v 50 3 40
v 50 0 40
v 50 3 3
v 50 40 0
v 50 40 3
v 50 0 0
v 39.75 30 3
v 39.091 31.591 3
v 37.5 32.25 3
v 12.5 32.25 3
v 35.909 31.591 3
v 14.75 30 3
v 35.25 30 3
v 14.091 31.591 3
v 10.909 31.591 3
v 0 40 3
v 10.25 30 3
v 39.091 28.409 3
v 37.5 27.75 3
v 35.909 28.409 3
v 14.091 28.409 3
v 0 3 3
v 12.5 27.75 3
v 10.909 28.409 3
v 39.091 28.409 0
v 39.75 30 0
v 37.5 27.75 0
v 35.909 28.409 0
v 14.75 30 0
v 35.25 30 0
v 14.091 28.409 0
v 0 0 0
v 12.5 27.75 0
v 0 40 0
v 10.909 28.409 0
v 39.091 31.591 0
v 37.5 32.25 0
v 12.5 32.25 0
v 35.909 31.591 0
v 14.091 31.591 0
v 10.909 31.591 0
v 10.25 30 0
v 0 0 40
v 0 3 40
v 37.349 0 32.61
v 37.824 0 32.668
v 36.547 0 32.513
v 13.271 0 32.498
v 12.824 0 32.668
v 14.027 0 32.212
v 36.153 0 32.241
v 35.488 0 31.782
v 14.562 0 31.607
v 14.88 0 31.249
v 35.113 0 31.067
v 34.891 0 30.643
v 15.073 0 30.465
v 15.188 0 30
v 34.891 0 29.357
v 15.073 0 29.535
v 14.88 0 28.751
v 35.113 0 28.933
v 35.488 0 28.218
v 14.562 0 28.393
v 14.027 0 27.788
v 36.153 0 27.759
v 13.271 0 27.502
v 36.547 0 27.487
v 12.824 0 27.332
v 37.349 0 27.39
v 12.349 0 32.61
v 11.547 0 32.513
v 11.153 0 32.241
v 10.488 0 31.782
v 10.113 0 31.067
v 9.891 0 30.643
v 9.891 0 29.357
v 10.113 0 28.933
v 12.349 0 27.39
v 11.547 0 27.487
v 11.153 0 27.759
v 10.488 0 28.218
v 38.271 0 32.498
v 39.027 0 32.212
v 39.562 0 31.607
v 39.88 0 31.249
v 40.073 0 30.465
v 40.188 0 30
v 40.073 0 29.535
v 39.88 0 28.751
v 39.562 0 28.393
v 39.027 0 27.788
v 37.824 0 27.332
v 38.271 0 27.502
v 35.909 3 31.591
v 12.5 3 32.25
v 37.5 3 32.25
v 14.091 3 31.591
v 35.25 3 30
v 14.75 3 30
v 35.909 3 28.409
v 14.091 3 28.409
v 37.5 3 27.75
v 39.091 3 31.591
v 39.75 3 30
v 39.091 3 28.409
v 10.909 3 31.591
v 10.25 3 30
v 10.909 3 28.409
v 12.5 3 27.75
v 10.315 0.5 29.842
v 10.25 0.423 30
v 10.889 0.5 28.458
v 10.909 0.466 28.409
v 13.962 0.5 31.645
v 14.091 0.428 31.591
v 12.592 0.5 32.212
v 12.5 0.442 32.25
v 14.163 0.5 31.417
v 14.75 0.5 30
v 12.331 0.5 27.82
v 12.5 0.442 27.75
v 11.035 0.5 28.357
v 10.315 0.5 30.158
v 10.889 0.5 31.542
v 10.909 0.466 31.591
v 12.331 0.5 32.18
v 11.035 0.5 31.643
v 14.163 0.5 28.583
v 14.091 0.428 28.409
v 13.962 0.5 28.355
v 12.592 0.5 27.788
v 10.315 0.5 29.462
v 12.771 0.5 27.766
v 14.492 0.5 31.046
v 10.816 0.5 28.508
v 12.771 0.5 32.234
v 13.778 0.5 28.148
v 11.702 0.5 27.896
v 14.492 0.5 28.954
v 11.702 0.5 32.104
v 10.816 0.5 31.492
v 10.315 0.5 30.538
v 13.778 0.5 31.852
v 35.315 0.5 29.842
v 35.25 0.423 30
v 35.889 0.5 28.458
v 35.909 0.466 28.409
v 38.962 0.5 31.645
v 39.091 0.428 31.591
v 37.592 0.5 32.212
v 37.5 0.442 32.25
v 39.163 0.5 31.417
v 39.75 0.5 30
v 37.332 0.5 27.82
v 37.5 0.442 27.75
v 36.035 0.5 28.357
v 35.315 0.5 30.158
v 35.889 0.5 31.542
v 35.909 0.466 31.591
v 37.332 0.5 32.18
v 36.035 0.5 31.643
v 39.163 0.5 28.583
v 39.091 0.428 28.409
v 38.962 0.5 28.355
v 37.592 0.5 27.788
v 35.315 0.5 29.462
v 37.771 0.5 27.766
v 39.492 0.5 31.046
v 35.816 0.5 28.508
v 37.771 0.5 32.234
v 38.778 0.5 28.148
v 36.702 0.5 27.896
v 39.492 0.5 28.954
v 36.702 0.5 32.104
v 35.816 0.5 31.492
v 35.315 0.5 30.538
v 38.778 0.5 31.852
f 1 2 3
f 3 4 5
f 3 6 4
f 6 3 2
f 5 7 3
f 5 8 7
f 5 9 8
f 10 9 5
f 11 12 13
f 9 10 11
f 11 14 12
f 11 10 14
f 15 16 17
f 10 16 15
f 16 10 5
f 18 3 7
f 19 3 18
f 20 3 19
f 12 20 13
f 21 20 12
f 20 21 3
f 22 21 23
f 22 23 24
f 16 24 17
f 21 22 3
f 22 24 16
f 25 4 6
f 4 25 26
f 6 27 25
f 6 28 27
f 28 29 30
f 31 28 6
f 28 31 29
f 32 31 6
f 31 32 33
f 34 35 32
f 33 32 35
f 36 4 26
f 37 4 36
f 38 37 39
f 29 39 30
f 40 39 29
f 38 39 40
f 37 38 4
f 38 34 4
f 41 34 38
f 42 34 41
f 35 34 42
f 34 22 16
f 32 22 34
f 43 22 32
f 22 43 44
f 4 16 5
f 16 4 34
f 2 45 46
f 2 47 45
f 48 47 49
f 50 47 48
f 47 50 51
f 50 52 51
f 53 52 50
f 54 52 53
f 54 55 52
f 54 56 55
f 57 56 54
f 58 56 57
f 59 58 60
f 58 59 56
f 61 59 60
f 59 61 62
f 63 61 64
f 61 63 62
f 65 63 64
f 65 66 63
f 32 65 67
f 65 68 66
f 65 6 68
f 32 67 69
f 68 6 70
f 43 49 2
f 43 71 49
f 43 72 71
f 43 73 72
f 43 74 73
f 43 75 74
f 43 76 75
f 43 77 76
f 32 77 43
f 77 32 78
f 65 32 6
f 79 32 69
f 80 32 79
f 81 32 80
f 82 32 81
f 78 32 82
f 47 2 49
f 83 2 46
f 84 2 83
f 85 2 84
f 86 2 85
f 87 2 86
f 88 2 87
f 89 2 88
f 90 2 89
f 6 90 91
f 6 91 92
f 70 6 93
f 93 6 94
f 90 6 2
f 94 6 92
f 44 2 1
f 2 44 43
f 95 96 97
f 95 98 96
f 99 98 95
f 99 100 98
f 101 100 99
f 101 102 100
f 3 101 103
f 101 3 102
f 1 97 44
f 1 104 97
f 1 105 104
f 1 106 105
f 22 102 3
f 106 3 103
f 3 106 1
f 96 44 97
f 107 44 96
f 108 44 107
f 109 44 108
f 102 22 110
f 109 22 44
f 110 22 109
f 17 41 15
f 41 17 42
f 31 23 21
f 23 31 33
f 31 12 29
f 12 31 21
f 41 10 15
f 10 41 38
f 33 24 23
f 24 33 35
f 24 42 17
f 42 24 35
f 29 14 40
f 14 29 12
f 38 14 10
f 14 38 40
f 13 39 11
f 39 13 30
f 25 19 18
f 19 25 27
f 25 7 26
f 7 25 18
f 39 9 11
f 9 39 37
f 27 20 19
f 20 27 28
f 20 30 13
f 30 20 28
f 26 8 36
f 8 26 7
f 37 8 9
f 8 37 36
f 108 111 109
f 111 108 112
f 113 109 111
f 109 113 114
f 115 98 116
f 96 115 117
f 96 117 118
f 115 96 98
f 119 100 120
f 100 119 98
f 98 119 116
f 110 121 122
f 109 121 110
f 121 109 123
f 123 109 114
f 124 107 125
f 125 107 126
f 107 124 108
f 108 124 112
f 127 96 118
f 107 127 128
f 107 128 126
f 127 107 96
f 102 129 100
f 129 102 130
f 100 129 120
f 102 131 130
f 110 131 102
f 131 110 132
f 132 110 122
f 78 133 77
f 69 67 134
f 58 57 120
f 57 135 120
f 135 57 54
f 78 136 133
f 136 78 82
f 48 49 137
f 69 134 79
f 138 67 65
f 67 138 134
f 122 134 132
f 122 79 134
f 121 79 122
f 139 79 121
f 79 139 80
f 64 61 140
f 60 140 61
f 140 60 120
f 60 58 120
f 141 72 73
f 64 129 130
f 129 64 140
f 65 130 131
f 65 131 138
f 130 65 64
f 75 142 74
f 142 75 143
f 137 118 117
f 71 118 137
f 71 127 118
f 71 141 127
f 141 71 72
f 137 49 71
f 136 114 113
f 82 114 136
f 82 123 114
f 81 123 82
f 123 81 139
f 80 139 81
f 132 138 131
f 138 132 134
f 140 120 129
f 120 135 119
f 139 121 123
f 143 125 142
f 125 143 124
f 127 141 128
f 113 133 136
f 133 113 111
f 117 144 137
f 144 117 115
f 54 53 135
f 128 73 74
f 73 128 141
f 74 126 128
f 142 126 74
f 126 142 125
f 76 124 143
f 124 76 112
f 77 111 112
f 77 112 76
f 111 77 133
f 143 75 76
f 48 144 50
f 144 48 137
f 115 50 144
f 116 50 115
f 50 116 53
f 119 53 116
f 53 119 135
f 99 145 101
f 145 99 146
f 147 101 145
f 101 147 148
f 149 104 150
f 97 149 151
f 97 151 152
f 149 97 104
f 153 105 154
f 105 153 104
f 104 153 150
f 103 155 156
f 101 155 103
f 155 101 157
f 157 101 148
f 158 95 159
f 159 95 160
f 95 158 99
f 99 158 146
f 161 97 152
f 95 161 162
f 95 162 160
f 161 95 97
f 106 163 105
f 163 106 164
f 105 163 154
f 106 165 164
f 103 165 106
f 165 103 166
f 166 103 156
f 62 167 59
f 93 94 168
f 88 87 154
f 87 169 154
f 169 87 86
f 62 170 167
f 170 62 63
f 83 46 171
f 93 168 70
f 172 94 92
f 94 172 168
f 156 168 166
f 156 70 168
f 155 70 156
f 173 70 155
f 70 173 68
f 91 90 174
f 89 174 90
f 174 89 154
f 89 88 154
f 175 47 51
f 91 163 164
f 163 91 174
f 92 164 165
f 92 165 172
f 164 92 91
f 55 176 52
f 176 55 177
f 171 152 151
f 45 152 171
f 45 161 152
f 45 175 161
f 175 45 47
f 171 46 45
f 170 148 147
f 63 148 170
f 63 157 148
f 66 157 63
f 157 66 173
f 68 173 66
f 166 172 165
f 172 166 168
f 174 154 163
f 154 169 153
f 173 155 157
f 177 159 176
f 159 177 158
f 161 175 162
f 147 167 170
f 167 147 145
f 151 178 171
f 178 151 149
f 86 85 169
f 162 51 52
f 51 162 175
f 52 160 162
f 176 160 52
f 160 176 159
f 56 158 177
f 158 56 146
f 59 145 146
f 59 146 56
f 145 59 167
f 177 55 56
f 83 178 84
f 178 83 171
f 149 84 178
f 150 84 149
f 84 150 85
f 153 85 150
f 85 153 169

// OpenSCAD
// パラメータ設定
width = 50;
depth = 40;
height = 40;
thickness = 3;

// ねじ穴設定
hole_dia = 4.5;
cs_dia = 8.0;
cs_depth = 2.0;

module countersunk_hole(is_vertical = false) {
    union() {
        // 貫通穴
        cylinder(d = hole_dia, h = thickness * 3, center = true);
        // 皿座面（外側の面に向けて配置）
        // 水平面なら下側(Z-)、垂直面なら外側(Y-)に座面を配置
        translate([0, 0, is_vertical ? -thickness / 2 + cs_depth / 2 : thickness / 2 - cs_depth / 2])
            cylinder(d1 = hole_dia, d2 = cs_dia, h = cs_depth);
    }
}

difference() {
    // L字金具の本体 (内側コーナーが原点)
    union() {
        // 水平面 (Y+方向に伸びる)
        cube([width, depth, thickness]);
        // 垂直面 (Z+方向に伸びる)
        cube([width, thickness, height]);
    }

    // 水平面の穴 (Y方向に10mm内側、X方向に左右対称)
    // 縁から10mmとは、外端(Y=40)から10mm手前=Y=30の位置
    for (x = [12.5, 37.5]) {
        translate([x, 30, 0])
            rotate([180, 0, 0])
                countersunk_hole(false);
    }

    // 垂直面の穴 (Z方向に10mm内側、X方向に左右対称)
    // 縁から10mmとは、上端(Z=40)から10mm下=Z=30の位置
    for (x = [12.5, 37.5]) {
        translate([x, 0, 30])
            rotate([90, 0, 0])
                countersunk_hole(true);
    }
}
